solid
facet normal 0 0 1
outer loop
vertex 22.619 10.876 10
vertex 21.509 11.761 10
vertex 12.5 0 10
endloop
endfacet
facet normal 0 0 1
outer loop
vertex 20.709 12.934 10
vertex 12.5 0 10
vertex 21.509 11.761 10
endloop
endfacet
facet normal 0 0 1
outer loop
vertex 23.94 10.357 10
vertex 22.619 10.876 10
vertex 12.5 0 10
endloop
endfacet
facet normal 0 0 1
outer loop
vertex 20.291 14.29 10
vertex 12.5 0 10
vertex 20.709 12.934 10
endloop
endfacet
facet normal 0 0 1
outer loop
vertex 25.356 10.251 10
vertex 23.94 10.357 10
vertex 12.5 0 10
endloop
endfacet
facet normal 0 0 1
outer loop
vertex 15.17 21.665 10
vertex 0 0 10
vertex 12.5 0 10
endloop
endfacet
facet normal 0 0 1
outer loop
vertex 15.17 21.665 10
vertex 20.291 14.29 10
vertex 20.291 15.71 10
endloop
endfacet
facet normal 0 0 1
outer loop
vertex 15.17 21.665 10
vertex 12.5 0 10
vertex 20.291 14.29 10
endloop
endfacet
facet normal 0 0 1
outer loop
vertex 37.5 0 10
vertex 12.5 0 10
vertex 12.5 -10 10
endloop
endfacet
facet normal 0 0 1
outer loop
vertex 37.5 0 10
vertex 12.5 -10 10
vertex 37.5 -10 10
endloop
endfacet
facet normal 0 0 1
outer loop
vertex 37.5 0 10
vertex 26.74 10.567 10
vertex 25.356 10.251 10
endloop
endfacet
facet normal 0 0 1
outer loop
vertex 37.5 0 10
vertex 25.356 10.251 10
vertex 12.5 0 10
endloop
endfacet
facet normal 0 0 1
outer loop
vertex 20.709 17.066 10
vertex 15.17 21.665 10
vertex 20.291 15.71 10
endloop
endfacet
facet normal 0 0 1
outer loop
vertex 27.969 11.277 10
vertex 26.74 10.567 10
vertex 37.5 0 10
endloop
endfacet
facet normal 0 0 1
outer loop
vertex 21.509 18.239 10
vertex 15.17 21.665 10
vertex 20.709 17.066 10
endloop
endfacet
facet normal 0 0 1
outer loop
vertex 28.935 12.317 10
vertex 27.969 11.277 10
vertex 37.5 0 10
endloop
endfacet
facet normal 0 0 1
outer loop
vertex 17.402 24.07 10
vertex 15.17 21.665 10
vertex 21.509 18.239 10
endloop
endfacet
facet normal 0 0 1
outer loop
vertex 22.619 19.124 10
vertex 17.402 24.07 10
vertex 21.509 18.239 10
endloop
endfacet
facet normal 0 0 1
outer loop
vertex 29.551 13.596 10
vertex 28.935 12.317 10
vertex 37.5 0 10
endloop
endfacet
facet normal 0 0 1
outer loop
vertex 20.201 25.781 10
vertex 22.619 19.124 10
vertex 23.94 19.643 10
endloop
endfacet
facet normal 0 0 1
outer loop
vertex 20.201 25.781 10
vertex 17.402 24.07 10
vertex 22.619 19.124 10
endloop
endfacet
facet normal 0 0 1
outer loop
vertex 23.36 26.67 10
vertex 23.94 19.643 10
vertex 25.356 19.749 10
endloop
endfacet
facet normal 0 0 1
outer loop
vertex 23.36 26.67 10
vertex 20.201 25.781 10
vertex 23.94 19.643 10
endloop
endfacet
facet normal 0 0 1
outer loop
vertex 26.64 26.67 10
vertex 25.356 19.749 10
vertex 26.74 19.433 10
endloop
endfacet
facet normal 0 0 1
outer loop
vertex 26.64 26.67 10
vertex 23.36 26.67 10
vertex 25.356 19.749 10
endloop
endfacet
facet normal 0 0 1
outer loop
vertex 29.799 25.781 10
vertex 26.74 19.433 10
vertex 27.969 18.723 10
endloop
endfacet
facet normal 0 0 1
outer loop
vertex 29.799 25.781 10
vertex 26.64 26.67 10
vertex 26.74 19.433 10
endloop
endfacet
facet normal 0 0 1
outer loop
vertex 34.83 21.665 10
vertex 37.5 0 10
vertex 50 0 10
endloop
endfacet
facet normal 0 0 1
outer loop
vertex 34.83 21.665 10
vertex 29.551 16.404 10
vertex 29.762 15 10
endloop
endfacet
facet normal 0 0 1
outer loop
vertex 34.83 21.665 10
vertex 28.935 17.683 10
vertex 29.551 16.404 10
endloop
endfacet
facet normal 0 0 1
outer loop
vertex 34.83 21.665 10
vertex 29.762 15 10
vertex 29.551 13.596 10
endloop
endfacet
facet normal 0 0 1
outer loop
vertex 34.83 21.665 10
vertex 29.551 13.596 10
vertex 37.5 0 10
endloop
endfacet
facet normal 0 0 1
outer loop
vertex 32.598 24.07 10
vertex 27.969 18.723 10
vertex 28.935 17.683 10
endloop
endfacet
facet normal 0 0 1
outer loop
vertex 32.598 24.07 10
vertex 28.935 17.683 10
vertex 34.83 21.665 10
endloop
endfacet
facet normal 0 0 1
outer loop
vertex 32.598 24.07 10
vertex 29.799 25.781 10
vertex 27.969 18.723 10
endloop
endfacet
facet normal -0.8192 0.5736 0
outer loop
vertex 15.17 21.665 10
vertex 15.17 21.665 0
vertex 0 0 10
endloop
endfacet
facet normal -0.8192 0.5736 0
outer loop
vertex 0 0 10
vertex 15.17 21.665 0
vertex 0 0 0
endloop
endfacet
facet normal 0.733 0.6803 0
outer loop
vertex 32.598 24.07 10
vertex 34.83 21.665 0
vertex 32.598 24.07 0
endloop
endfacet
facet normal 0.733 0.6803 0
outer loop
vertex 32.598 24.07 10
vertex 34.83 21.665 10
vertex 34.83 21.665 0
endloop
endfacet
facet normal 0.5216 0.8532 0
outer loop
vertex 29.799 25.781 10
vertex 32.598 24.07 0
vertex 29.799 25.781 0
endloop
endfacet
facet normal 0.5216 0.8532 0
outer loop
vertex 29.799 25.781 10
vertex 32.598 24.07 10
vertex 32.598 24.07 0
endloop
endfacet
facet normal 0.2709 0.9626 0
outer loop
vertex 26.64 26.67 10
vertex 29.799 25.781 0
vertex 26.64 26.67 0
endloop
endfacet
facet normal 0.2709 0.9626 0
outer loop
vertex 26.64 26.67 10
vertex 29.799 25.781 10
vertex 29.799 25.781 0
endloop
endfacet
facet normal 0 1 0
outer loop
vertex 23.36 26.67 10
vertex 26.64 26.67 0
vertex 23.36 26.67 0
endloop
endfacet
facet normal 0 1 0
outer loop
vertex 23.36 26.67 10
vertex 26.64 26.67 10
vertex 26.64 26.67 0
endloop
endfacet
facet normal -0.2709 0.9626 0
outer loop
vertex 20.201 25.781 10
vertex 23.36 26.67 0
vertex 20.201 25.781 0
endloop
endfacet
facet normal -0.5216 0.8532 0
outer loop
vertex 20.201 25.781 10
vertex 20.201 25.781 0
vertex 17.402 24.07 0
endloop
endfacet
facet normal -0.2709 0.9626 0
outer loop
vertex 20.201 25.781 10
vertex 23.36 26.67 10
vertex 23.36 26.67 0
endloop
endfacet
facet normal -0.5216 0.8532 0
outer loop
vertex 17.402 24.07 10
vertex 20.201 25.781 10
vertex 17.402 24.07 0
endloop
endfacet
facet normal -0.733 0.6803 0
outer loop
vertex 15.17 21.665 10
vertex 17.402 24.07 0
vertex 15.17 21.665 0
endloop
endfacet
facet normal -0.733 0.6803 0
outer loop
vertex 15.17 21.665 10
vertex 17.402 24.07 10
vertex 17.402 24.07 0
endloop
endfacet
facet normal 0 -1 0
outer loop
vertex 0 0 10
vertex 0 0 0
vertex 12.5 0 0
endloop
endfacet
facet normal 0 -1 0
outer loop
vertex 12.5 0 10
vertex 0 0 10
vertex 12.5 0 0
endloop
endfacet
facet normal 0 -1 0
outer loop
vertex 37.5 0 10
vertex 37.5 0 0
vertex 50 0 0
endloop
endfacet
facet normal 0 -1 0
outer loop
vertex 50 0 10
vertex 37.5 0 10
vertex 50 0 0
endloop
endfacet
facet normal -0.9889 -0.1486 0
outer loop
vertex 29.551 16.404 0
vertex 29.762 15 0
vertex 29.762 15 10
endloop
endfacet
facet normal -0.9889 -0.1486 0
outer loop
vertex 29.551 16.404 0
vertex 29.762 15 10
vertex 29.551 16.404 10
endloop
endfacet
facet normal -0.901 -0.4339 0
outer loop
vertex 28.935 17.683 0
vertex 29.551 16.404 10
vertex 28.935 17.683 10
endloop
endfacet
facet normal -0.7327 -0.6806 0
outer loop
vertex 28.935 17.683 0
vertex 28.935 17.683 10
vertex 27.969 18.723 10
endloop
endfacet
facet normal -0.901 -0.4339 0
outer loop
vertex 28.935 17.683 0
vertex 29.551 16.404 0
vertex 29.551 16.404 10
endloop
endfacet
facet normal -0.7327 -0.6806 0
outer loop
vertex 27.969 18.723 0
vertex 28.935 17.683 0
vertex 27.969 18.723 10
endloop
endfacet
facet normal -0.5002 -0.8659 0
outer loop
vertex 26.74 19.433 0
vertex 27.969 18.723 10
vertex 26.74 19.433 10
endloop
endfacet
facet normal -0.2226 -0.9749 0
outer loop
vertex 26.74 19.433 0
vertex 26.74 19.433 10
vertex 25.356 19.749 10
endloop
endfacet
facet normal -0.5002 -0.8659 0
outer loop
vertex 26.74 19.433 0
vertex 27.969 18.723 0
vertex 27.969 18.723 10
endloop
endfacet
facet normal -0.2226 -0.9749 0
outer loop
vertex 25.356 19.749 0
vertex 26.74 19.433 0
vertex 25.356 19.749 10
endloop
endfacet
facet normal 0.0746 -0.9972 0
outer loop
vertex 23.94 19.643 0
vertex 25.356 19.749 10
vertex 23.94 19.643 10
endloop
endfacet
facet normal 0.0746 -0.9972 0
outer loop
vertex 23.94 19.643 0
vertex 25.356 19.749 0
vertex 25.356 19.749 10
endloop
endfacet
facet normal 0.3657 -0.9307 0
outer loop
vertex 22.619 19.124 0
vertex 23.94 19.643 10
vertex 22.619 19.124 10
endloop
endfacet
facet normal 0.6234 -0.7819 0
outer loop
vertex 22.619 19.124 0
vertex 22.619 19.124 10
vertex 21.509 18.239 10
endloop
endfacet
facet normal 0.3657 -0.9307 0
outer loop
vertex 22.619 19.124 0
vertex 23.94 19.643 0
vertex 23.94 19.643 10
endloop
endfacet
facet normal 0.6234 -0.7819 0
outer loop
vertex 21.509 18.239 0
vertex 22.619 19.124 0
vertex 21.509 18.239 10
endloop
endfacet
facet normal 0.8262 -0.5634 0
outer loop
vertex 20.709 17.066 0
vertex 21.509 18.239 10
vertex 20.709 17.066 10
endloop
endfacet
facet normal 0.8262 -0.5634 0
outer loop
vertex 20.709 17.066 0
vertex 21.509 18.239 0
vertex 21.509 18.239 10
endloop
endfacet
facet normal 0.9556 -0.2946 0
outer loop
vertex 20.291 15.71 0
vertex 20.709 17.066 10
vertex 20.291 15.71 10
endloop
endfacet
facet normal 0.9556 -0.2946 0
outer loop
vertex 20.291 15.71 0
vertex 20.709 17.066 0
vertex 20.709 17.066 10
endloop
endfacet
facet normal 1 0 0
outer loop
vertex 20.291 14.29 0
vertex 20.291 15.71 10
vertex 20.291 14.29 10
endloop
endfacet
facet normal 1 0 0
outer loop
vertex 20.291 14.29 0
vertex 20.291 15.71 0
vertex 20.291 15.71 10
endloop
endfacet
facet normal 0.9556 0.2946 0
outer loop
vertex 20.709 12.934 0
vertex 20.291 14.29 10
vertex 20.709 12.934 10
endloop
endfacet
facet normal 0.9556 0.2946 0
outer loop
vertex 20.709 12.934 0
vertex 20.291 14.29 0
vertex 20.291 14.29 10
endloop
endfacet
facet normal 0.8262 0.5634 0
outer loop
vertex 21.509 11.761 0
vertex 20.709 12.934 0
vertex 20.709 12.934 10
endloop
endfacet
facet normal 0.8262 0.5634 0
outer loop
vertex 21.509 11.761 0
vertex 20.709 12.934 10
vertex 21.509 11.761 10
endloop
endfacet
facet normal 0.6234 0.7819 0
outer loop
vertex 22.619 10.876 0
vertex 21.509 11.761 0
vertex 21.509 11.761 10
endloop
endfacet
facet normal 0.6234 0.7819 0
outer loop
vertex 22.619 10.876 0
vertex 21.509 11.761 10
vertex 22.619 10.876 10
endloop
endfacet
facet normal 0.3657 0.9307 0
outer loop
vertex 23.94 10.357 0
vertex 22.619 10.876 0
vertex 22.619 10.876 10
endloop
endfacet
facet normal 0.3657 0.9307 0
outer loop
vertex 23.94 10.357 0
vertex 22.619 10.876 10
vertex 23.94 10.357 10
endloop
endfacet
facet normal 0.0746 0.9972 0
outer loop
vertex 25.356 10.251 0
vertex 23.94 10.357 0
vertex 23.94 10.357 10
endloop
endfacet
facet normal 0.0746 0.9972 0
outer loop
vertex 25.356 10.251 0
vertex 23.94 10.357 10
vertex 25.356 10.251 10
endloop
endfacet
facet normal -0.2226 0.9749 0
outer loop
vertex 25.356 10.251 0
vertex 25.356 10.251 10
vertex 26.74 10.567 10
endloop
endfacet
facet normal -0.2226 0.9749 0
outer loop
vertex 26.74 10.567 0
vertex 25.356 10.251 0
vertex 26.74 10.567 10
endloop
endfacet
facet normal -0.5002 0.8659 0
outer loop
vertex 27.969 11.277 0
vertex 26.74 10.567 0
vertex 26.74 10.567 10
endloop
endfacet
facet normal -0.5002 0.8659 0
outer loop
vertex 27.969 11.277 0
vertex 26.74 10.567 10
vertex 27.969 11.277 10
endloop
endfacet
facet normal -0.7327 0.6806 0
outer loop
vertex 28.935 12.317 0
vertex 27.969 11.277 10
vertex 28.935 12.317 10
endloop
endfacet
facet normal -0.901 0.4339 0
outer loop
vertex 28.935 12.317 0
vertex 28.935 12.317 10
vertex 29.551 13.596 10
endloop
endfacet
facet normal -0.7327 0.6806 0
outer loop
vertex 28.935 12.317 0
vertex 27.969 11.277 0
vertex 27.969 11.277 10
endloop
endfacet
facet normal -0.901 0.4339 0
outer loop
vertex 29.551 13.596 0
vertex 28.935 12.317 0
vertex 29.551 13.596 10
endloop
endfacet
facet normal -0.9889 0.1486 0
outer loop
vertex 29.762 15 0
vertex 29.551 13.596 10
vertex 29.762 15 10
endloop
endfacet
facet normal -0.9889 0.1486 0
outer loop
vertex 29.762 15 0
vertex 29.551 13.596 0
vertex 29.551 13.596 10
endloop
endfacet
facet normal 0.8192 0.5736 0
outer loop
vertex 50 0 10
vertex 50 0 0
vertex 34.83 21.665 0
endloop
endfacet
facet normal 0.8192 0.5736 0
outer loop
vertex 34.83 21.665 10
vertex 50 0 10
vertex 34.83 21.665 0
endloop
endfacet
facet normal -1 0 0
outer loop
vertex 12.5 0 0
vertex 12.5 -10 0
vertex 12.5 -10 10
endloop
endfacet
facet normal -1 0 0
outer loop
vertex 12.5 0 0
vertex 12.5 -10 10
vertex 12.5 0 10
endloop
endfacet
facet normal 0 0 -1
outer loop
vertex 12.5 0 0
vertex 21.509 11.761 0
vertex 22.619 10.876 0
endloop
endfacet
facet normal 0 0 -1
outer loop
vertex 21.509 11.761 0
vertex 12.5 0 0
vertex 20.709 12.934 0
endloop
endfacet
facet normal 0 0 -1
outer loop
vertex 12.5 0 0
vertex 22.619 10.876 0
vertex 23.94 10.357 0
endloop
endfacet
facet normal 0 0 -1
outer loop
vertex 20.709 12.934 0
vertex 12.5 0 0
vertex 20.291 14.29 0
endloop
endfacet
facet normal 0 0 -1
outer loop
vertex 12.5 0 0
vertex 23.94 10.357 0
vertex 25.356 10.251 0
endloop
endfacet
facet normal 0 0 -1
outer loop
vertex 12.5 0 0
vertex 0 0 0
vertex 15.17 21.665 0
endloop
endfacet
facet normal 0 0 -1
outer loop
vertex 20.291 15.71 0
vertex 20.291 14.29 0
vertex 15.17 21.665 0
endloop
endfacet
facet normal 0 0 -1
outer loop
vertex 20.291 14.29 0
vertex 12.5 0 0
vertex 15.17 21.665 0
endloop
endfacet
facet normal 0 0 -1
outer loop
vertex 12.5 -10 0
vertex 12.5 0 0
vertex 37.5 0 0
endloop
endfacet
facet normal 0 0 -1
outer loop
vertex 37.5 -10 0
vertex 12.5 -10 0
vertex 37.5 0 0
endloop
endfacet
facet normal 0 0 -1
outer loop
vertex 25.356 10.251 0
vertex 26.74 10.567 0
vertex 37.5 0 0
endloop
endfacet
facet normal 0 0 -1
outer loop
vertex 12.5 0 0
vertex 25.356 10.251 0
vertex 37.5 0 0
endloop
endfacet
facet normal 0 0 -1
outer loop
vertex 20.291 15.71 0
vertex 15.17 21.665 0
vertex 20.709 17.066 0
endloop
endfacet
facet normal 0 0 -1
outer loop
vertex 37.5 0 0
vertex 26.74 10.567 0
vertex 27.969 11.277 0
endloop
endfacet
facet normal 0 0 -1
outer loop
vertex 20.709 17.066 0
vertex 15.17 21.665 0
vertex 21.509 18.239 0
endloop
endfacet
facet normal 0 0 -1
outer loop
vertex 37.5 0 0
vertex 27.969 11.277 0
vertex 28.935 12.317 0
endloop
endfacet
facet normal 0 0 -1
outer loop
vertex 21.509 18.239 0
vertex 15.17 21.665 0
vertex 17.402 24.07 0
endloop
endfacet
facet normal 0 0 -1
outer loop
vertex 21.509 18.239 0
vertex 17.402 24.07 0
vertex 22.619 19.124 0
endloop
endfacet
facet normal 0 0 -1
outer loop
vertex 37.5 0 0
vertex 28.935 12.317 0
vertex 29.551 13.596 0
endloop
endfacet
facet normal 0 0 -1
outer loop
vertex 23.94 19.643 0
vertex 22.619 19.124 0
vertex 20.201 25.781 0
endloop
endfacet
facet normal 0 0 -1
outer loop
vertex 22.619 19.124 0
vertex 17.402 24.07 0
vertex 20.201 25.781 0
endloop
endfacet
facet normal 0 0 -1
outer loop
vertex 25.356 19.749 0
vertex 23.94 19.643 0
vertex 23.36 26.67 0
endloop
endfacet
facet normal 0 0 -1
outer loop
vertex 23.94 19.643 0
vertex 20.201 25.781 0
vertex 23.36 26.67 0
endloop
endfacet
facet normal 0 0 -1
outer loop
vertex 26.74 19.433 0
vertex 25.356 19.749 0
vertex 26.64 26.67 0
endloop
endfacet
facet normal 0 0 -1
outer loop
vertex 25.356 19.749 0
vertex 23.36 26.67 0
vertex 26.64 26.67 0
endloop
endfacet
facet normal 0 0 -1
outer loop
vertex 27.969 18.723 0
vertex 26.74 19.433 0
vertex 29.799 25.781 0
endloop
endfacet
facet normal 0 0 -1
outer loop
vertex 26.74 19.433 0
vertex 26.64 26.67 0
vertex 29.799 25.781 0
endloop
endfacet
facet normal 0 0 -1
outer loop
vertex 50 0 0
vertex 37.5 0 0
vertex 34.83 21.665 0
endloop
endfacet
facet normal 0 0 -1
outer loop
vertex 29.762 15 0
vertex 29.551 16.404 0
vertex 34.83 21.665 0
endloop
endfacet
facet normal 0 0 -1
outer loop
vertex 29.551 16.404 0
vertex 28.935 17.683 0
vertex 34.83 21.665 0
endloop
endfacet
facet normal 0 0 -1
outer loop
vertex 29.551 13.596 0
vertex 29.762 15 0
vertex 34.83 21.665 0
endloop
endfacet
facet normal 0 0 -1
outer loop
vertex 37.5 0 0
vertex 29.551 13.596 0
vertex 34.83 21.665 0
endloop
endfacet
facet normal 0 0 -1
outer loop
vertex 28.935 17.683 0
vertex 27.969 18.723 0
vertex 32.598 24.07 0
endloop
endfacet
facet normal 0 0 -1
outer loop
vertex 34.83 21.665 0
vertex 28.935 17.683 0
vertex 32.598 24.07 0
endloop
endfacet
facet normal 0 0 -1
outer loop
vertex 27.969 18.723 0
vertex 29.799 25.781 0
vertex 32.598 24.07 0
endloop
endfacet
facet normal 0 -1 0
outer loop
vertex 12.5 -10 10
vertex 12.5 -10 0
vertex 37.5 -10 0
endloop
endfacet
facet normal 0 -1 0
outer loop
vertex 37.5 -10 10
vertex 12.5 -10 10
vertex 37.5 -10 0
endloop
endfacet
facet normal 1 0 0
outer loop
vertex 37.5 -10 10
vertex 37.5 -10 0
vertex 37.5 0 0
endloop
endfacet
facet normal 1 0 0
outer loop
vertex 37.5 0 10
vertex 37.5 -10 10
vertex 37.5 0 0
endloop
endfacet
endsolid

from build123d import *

# Parameters (mm, degrees)
SKETCH1_R           = 4.7625
SKETCH1_W           = 25
SKETCH1_H           = 10
BOSS_EXTRUDE1_DEPTH = 10
FILLET1_R           = 12


with BuildPart() as part:
    # Sketch1 → Boss-Extrude1 (new body)
    with BuildSketch(Plane.XY):
        Polygon((50, 0), (25, 35.703700169), (0, 0), align=None)
        with Locations((25, 15)):
            Circle(SKETCH1_R, mode=Mode.SUBTRACT)
        with Locations((25, -5)):
            Rectangle(SKETCH1_W, SKETCH1_H)
    extrude(amount=BOSS_EXTRUDE1_DEPTH)

    # Fillet1
    fillet1_edges = [part.edges().sort_by_distance(p)[0] for p in [
        (25, 35.703700169, 5),
    ]]
    fillet(fillet1_edges, radius=FILLET1_R)


solid = part.part
